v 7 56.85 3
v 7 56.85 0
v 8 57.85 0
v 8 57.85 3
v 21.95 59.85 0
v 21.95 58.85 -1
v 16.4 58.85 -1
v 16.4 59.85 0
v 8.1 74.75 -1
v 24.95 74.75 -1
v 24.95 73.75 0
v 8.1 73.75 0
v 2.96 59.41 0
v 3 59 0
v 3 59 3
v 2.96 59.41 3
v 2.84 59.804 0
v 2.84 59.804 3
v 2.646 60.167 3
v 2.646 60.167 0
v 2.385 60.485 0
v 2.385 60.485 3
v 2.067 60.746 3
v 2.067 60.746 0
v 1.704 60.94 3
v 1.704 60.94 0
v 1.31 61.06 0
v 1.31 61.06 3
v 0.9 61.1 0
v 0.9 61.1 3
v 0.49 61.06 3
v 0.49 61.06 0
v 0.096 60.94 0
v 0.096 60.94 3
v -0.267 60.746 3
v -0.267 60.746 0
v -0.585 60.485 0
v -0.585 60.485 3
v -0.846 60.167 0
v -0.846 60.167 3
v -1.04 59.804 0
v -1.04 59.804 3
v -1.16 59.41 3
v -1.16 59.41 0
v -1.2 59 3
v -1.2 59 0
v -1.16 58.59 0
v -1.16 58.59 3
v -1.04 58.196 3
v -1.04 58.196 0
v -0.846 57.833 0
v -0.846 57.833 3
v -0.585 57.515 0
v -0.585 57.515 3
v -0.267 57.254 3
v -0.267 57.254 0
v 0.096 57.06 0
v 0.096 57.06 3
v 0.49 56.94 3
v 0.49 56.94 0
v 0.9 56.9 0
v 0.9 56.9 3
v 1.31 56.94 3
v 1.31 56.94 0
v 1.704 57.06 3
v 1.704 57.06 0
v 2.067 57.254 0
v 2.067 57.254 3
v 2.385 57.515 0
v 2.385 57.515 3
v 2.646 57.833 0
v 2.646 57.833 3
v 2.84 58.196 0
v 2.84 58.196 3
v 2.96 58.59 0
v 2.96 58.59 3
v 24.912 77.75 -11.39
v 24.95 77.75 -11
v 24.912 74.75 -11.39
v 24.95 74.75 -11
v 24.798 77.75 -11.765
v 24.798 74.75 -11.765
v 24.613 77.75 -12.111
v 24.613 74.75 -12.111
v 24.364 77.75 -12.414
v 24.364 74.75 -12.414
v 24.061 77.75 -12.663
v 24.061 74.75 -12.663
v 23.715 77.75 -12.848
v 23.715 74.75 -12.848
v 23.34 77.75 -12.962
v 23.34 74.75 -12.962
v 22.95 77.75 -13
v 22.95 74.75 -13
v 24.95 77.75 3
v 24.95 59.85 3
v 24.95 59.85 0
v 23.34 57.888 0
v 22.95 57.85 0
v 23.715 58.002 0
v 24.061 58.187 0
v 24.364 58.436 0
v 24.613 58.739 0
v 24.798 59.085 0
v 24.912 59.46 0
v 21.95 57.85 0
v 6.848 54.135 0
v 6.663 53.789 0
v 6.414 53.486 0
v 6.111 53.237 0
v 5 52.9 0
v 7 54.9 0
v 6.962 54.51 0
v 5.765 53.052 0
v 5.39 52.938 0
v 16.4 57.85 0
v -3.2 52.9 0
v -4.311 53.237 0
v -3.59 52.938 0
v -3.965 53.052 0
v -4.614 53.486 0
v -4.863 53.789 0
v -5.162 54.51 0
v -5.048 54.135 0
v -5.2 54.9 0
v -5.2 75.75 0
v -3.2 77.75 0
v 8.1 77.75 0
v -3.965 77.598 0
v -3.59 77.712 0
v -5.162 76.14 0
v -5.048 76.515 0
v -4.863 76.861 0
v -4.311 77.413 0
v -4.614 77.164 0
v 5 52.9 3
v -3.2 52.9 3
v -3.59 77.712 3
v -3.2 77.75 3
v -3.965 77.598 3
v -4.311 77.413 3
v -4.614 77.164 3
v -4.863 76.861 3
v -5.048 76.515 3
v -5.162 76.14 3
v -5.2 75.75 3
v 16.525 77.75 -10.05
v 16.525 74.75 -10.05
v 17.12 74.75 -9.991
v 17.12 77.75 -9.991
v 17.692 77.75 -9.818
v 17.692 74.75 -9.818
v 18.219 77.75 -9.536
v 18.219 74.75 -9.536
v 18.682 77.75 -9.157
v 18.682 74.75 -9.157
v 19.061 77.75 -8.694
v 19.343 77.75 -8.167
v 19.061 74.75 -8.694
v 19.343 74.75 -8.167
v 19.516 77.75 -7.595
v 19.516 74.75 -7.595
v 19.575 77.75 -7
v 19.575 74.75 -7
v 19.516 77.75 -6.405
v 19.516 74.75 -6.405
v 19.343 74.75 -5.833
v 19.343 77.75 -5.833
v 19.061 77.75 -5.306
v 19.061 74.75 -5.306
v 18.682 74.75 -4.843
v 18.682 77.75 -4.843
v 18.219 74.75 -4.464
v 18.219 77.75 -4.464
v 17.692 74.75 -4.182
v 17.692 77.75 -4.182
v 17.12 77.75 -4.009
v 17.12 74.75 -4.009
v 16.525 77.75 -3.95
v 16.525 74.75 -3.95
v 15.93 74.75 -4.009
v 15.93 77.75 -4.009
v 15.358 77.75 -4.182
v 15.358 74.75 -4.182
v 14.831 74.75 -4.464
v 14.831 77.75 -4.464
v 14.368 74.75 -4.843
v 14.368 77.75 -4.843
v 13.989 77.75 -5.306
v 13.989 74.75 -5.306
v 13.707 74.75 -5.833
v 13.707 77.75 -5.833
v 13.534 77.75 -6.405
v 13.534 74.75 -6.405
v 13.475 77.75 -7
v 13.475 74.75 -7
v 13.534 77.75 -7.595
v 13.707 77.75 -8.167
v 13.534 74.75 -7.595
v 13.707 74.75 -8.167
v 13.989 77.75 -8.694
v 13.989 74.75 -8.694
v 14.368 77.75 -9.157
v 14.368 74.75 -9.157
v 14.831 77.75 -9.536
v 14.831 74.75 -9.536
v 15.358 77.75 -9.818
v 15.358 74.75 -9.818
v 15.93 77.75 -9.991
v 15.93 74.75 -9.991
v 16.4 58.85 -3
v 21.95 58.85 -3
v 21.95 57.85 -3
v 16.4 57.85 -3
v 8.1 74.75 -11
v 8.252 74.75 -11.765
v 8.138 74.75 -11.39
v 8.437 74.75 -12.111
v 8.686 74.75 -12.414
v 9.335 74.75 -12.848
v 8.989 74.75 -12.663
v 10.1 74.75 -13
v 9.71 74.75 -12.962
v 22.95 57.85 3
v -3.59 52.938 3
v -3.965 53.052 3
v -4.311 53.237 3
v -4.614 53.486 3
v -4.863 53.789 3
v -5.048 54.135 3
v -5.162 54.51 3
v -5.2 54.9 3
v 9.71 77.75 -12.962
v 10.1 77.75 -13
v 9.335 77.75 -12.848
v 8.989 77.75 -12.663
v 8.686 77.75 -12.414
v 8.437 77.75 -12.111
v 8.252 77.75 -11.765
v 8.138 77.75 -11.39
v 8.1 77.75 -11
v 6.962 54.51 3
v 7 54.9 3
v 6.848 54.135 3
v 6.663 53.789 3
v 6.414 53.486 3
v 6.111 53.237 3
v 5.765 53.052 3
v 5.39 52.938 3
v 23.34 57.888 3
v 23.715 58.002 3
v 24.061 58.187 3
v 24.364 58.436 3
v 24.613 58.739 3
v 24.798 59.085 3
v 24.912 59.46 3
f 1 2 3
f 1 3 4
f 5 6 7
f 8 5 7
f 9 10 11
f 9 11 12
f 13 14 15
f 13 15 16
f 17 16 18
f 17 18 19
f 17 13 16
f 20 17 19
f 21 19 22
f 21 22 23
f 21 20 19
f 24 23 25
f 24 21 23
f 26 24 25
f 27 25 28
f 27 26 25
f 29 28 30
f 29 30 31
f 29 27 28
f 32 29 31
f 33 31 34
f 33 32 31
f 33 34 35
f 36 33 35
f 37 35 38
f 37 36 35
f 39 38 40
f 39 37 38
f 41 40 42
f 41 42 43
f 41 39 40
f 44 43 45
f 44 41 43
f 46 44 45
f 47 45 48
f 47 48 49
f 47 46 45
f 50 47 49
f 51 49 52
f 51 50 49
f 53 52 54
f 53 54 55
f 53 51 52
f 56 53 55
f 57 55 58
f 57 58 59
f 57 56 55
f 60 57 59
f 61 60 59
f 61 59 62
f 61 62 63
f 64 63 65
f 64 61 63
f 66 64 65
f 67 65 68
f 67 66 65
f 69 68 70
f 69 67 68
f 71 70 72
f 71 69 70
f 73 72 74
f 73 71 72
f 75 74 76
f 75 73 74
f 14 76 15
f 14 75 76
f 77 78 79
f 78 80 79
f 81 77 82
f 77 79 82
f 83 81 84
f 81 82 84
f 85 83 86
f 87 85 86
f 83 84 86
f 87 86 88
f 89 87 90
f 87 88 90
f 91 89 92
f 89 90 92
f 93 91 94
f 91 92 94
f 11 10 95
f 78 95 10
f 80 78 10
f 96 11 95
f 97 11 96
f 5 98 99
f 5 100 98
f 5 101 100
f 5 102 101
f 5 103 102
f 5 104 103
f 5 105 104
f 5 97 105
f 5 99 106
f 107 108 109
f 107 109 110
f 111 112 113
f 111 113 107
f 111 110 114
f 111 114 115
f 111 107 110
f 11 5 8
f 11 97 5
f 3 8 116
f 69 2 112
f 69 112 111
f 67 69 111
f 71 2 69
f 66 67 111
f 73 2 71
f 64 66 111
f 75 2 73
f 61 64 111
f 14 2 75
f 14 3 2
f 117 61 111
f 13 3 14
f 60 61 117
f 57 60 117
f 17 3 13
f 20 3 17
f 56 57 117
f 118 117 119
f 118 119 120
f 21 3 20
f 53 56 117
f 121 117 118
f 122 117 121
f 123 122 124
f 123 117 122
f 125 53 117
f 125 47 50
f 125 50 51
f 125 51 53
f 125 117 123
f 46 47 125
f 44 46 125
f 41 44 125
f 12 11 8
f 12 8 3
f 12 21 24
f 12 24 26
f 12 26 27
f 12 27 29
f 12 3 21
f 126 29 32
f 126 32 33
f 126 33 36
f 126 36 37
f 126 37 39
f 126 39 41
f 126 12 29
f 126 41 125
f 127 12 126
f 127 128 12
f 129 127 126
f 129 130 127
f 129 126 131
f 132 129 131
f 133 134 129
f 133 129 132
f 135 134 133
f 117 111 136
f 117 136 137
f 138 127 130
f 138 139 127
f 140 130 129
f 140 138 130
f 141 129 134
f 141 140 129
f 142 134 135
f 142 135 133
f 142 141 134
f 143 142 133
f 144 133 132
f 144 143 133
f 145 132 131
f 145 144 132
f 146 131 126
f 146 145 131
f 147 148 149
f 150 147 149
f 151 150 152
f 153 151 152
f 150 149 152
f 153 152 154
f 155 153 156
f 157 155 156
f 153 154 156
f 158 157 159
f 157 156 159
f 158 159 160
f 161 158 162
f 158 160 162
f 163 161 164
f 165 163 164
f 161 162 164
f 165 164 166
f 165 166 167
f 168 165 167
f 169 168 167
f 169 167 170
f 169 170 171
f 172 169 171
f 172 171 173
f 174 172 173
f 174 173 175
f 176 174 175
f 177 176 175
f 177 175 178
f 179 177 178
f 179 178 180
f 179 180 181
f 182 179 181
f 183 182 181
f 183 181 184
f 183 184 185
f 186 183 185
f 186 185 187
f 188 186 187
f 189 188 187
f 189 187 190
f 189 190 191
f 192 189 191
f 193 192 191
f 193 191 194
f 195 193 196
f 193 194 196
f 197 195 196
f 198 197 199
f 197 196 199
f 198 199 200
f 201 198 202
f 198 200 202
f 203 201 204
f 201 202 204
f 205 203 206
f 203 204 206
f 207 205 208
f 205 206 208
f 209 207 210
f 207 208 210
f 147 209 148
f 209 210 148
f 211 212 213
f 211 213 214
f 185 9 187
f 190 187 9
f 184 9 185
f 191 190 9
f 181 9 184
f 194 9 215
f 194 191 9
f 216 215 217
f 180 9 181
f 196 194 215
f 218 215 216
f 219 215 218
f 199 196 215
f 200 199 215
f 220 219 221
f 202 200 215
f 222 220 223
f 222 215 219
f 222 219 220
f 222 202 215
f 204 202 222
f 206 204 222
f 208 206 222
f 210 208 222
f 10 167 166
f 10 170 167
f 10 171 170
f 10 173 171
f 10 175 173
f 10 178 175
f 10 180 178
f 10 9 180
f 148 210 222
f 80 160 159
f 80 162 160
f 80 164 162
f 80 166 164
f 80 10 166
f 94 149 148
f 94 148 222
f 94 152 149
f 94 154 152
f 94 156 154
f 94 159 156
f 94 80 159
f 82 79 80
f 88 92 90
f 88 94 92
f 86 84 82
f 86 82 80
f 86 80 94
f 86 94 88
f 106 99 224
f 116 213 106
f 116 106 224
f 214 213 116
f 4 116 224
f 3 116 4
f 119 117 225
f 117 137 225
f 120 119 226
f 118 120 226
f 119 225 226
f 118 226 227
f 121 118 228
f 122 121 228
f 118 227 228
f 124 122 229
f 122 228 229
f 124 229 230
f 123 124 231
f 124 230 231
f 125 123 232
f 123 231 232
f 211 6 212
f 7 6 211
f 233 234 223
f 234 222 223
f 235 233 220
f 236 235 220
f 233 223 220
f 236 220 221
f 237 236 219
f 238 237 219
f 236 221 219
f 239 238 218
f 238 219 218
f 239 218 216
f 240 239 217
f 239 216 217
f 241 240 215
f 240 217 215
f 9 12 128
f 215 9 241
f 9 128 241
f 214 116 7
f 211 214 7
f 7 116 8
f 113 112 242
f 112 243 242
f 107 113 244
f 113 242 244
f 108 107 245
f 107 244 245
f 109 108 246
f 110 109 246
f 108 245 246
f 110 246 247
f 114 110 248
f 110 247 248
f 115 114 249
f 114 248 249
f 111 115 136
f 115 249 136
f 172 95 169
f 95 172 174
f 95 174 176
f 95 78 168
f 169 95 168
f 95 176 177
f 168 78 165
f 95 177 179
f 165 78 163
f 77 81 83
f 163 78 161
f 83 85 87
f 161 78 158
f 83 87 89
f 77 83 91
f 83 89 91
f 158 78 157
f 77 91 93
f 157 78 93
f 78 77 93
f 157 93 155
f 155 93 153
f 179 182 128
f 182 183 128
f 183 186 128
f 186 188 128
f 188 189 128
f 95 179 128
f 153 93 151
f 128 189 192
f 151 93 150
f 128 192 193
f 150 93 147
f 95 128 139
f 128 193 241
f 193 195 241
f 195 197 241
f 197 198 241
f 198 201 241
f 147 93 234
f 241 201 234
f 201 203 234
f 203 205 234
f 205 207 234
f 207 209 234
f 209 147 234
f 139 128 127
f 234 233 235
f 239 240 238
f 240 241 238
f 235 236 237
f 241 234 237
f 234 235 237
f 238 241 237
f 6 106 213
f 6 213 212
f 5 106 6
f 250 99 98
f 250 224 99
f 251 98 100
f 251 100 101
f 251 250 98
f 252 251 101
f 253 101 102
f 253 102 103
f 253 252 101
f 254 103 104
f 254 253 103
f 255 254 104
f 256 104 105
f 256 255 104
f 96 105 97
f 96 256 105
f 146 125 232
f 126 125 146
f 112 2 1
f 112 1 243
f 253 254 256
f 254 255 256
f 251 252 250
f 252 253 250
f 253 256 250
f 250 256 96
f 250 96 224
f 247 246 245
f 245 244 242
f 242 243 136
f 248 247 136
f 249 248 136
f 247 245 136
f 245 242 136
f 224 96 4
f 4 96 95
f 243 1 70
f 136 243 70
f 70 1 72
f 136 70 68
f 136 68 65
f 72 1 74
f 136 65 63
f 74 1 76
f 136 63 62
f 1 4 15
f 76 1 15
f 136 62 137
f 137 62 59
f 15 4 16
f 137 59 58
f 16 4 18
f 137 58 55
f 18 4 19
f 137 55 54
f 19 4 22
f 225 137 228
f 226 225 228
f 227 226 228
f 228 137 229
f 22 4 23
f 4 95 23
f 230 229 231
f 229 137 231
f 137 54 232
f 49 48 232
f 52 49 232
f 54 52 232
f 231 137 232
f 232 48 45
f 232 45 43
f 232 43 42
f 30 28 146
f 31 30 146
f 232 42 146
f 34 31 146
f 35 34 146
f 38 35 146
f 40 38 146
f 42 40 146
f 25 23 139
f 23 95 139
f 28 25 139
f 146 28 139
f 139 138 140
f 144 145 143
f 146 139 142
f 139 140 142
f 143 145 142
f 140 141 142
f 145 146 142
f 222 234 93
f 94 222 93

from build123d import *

# Parameters (mm, degrees)
SKETCH1_R           = 2.1
BOSS_EXTRUDE1_DEPTH = 3
SKETCH2_W           = 16
SKETCH2_H           = 16.85
BOSS_EXTRUDE2_DEPTH = 3
SKETCH4_W           = 5.55
SKETCH4_H           = 1
BOSS_EXTRUDE3_DEPTH = 3
CHAMFER1_SIZE       = 1
SKETCH3_R           = 3.05
CUT_EXTRUDE1_DEPTH  = 4
FILLET1_R           = 2


with BuildPart() as part:
    # Sketch1 → Boss-Extrude1 (new body)
    with BuildSketch(Plane.XY):
        Polygon((-5.2, 77.75), (7, 77.75), (24.95, 77.75), (24.95, 57.85), (7, 57.85), (7, 52.9), (-5.2, 52.9), align=None)
        with Locations((0.9, 59)):
            Circle(SKETCH1_R, mode=Mode.SUBTRACT)
    extrude(amount=BOSS_EXTRUDE1_DEPTH)

    # Sketch2 → Boss-Extrude2 (add)
    with BuildSketch(Plane(origin=(-52.8, 77.75, 0), x_dir=(0, 0, -1), z_dir=(0, -1, 0))):
        with Locations((5, 69.325)):
            Rectangle(SKETCH2_W, SKETCH2_H)
    extrude(amount=BOSS_EXTRUDE2_DEPTH)

    # Sketch4 → Boss-Extrude3 (add)
    with BuildSketch(Plane(origin=(0, 0, 0), x_dir=(-1, 0, 0), z_dir=(0, 0, -1))):
        with Locations((-19.175, 58.35)):
            Rectangle(SKETCH4_W, SKETCH4_H)
    extrude(amount=BOSS_EXTRUDE3_DEPTH)

    # Chamfer1
    chamfer1_edges = [part.edges().sort_by_distance(p)[0] for p in [
        (7, 57.85, 1.5),
        (16.525, 74.75, 0),
        (19.175, 58.85, 0),
    ]]
    chamfer(chamfer1_edges, length=CHAMFER1_SIZE)

    # Sketch3 → Cut-Extrude1 (cut, through all)
    with BuildSketch(Plane(origin=(0, 74.75, 0), x_dir=(0, 0, -1), z_dir=(0, -1, 0))):
        with Locations((7, 16.525)):
            Circle(SKETCH3_R)
    extrude(amount=-CUT_EXTRUDE1_DEPTH, mode=Mode.SUBTRACT)

    # Fillet1
    fillet1_edges = [part.edges().sort_by_distance(p)[0] for p in [
        (-5.2, 77.75, 1.5),
        (24.95, 57.85, 1.5),
        (7, 52.9, 1.5),
        (-5.2, 52.9, 1.5),
        (24.95, 76.25, -13),
        (8.1, 76.25, -13),
    ]]
    fillet(fillet1_edges, radius=FILLET1_R)


solid = part.part
